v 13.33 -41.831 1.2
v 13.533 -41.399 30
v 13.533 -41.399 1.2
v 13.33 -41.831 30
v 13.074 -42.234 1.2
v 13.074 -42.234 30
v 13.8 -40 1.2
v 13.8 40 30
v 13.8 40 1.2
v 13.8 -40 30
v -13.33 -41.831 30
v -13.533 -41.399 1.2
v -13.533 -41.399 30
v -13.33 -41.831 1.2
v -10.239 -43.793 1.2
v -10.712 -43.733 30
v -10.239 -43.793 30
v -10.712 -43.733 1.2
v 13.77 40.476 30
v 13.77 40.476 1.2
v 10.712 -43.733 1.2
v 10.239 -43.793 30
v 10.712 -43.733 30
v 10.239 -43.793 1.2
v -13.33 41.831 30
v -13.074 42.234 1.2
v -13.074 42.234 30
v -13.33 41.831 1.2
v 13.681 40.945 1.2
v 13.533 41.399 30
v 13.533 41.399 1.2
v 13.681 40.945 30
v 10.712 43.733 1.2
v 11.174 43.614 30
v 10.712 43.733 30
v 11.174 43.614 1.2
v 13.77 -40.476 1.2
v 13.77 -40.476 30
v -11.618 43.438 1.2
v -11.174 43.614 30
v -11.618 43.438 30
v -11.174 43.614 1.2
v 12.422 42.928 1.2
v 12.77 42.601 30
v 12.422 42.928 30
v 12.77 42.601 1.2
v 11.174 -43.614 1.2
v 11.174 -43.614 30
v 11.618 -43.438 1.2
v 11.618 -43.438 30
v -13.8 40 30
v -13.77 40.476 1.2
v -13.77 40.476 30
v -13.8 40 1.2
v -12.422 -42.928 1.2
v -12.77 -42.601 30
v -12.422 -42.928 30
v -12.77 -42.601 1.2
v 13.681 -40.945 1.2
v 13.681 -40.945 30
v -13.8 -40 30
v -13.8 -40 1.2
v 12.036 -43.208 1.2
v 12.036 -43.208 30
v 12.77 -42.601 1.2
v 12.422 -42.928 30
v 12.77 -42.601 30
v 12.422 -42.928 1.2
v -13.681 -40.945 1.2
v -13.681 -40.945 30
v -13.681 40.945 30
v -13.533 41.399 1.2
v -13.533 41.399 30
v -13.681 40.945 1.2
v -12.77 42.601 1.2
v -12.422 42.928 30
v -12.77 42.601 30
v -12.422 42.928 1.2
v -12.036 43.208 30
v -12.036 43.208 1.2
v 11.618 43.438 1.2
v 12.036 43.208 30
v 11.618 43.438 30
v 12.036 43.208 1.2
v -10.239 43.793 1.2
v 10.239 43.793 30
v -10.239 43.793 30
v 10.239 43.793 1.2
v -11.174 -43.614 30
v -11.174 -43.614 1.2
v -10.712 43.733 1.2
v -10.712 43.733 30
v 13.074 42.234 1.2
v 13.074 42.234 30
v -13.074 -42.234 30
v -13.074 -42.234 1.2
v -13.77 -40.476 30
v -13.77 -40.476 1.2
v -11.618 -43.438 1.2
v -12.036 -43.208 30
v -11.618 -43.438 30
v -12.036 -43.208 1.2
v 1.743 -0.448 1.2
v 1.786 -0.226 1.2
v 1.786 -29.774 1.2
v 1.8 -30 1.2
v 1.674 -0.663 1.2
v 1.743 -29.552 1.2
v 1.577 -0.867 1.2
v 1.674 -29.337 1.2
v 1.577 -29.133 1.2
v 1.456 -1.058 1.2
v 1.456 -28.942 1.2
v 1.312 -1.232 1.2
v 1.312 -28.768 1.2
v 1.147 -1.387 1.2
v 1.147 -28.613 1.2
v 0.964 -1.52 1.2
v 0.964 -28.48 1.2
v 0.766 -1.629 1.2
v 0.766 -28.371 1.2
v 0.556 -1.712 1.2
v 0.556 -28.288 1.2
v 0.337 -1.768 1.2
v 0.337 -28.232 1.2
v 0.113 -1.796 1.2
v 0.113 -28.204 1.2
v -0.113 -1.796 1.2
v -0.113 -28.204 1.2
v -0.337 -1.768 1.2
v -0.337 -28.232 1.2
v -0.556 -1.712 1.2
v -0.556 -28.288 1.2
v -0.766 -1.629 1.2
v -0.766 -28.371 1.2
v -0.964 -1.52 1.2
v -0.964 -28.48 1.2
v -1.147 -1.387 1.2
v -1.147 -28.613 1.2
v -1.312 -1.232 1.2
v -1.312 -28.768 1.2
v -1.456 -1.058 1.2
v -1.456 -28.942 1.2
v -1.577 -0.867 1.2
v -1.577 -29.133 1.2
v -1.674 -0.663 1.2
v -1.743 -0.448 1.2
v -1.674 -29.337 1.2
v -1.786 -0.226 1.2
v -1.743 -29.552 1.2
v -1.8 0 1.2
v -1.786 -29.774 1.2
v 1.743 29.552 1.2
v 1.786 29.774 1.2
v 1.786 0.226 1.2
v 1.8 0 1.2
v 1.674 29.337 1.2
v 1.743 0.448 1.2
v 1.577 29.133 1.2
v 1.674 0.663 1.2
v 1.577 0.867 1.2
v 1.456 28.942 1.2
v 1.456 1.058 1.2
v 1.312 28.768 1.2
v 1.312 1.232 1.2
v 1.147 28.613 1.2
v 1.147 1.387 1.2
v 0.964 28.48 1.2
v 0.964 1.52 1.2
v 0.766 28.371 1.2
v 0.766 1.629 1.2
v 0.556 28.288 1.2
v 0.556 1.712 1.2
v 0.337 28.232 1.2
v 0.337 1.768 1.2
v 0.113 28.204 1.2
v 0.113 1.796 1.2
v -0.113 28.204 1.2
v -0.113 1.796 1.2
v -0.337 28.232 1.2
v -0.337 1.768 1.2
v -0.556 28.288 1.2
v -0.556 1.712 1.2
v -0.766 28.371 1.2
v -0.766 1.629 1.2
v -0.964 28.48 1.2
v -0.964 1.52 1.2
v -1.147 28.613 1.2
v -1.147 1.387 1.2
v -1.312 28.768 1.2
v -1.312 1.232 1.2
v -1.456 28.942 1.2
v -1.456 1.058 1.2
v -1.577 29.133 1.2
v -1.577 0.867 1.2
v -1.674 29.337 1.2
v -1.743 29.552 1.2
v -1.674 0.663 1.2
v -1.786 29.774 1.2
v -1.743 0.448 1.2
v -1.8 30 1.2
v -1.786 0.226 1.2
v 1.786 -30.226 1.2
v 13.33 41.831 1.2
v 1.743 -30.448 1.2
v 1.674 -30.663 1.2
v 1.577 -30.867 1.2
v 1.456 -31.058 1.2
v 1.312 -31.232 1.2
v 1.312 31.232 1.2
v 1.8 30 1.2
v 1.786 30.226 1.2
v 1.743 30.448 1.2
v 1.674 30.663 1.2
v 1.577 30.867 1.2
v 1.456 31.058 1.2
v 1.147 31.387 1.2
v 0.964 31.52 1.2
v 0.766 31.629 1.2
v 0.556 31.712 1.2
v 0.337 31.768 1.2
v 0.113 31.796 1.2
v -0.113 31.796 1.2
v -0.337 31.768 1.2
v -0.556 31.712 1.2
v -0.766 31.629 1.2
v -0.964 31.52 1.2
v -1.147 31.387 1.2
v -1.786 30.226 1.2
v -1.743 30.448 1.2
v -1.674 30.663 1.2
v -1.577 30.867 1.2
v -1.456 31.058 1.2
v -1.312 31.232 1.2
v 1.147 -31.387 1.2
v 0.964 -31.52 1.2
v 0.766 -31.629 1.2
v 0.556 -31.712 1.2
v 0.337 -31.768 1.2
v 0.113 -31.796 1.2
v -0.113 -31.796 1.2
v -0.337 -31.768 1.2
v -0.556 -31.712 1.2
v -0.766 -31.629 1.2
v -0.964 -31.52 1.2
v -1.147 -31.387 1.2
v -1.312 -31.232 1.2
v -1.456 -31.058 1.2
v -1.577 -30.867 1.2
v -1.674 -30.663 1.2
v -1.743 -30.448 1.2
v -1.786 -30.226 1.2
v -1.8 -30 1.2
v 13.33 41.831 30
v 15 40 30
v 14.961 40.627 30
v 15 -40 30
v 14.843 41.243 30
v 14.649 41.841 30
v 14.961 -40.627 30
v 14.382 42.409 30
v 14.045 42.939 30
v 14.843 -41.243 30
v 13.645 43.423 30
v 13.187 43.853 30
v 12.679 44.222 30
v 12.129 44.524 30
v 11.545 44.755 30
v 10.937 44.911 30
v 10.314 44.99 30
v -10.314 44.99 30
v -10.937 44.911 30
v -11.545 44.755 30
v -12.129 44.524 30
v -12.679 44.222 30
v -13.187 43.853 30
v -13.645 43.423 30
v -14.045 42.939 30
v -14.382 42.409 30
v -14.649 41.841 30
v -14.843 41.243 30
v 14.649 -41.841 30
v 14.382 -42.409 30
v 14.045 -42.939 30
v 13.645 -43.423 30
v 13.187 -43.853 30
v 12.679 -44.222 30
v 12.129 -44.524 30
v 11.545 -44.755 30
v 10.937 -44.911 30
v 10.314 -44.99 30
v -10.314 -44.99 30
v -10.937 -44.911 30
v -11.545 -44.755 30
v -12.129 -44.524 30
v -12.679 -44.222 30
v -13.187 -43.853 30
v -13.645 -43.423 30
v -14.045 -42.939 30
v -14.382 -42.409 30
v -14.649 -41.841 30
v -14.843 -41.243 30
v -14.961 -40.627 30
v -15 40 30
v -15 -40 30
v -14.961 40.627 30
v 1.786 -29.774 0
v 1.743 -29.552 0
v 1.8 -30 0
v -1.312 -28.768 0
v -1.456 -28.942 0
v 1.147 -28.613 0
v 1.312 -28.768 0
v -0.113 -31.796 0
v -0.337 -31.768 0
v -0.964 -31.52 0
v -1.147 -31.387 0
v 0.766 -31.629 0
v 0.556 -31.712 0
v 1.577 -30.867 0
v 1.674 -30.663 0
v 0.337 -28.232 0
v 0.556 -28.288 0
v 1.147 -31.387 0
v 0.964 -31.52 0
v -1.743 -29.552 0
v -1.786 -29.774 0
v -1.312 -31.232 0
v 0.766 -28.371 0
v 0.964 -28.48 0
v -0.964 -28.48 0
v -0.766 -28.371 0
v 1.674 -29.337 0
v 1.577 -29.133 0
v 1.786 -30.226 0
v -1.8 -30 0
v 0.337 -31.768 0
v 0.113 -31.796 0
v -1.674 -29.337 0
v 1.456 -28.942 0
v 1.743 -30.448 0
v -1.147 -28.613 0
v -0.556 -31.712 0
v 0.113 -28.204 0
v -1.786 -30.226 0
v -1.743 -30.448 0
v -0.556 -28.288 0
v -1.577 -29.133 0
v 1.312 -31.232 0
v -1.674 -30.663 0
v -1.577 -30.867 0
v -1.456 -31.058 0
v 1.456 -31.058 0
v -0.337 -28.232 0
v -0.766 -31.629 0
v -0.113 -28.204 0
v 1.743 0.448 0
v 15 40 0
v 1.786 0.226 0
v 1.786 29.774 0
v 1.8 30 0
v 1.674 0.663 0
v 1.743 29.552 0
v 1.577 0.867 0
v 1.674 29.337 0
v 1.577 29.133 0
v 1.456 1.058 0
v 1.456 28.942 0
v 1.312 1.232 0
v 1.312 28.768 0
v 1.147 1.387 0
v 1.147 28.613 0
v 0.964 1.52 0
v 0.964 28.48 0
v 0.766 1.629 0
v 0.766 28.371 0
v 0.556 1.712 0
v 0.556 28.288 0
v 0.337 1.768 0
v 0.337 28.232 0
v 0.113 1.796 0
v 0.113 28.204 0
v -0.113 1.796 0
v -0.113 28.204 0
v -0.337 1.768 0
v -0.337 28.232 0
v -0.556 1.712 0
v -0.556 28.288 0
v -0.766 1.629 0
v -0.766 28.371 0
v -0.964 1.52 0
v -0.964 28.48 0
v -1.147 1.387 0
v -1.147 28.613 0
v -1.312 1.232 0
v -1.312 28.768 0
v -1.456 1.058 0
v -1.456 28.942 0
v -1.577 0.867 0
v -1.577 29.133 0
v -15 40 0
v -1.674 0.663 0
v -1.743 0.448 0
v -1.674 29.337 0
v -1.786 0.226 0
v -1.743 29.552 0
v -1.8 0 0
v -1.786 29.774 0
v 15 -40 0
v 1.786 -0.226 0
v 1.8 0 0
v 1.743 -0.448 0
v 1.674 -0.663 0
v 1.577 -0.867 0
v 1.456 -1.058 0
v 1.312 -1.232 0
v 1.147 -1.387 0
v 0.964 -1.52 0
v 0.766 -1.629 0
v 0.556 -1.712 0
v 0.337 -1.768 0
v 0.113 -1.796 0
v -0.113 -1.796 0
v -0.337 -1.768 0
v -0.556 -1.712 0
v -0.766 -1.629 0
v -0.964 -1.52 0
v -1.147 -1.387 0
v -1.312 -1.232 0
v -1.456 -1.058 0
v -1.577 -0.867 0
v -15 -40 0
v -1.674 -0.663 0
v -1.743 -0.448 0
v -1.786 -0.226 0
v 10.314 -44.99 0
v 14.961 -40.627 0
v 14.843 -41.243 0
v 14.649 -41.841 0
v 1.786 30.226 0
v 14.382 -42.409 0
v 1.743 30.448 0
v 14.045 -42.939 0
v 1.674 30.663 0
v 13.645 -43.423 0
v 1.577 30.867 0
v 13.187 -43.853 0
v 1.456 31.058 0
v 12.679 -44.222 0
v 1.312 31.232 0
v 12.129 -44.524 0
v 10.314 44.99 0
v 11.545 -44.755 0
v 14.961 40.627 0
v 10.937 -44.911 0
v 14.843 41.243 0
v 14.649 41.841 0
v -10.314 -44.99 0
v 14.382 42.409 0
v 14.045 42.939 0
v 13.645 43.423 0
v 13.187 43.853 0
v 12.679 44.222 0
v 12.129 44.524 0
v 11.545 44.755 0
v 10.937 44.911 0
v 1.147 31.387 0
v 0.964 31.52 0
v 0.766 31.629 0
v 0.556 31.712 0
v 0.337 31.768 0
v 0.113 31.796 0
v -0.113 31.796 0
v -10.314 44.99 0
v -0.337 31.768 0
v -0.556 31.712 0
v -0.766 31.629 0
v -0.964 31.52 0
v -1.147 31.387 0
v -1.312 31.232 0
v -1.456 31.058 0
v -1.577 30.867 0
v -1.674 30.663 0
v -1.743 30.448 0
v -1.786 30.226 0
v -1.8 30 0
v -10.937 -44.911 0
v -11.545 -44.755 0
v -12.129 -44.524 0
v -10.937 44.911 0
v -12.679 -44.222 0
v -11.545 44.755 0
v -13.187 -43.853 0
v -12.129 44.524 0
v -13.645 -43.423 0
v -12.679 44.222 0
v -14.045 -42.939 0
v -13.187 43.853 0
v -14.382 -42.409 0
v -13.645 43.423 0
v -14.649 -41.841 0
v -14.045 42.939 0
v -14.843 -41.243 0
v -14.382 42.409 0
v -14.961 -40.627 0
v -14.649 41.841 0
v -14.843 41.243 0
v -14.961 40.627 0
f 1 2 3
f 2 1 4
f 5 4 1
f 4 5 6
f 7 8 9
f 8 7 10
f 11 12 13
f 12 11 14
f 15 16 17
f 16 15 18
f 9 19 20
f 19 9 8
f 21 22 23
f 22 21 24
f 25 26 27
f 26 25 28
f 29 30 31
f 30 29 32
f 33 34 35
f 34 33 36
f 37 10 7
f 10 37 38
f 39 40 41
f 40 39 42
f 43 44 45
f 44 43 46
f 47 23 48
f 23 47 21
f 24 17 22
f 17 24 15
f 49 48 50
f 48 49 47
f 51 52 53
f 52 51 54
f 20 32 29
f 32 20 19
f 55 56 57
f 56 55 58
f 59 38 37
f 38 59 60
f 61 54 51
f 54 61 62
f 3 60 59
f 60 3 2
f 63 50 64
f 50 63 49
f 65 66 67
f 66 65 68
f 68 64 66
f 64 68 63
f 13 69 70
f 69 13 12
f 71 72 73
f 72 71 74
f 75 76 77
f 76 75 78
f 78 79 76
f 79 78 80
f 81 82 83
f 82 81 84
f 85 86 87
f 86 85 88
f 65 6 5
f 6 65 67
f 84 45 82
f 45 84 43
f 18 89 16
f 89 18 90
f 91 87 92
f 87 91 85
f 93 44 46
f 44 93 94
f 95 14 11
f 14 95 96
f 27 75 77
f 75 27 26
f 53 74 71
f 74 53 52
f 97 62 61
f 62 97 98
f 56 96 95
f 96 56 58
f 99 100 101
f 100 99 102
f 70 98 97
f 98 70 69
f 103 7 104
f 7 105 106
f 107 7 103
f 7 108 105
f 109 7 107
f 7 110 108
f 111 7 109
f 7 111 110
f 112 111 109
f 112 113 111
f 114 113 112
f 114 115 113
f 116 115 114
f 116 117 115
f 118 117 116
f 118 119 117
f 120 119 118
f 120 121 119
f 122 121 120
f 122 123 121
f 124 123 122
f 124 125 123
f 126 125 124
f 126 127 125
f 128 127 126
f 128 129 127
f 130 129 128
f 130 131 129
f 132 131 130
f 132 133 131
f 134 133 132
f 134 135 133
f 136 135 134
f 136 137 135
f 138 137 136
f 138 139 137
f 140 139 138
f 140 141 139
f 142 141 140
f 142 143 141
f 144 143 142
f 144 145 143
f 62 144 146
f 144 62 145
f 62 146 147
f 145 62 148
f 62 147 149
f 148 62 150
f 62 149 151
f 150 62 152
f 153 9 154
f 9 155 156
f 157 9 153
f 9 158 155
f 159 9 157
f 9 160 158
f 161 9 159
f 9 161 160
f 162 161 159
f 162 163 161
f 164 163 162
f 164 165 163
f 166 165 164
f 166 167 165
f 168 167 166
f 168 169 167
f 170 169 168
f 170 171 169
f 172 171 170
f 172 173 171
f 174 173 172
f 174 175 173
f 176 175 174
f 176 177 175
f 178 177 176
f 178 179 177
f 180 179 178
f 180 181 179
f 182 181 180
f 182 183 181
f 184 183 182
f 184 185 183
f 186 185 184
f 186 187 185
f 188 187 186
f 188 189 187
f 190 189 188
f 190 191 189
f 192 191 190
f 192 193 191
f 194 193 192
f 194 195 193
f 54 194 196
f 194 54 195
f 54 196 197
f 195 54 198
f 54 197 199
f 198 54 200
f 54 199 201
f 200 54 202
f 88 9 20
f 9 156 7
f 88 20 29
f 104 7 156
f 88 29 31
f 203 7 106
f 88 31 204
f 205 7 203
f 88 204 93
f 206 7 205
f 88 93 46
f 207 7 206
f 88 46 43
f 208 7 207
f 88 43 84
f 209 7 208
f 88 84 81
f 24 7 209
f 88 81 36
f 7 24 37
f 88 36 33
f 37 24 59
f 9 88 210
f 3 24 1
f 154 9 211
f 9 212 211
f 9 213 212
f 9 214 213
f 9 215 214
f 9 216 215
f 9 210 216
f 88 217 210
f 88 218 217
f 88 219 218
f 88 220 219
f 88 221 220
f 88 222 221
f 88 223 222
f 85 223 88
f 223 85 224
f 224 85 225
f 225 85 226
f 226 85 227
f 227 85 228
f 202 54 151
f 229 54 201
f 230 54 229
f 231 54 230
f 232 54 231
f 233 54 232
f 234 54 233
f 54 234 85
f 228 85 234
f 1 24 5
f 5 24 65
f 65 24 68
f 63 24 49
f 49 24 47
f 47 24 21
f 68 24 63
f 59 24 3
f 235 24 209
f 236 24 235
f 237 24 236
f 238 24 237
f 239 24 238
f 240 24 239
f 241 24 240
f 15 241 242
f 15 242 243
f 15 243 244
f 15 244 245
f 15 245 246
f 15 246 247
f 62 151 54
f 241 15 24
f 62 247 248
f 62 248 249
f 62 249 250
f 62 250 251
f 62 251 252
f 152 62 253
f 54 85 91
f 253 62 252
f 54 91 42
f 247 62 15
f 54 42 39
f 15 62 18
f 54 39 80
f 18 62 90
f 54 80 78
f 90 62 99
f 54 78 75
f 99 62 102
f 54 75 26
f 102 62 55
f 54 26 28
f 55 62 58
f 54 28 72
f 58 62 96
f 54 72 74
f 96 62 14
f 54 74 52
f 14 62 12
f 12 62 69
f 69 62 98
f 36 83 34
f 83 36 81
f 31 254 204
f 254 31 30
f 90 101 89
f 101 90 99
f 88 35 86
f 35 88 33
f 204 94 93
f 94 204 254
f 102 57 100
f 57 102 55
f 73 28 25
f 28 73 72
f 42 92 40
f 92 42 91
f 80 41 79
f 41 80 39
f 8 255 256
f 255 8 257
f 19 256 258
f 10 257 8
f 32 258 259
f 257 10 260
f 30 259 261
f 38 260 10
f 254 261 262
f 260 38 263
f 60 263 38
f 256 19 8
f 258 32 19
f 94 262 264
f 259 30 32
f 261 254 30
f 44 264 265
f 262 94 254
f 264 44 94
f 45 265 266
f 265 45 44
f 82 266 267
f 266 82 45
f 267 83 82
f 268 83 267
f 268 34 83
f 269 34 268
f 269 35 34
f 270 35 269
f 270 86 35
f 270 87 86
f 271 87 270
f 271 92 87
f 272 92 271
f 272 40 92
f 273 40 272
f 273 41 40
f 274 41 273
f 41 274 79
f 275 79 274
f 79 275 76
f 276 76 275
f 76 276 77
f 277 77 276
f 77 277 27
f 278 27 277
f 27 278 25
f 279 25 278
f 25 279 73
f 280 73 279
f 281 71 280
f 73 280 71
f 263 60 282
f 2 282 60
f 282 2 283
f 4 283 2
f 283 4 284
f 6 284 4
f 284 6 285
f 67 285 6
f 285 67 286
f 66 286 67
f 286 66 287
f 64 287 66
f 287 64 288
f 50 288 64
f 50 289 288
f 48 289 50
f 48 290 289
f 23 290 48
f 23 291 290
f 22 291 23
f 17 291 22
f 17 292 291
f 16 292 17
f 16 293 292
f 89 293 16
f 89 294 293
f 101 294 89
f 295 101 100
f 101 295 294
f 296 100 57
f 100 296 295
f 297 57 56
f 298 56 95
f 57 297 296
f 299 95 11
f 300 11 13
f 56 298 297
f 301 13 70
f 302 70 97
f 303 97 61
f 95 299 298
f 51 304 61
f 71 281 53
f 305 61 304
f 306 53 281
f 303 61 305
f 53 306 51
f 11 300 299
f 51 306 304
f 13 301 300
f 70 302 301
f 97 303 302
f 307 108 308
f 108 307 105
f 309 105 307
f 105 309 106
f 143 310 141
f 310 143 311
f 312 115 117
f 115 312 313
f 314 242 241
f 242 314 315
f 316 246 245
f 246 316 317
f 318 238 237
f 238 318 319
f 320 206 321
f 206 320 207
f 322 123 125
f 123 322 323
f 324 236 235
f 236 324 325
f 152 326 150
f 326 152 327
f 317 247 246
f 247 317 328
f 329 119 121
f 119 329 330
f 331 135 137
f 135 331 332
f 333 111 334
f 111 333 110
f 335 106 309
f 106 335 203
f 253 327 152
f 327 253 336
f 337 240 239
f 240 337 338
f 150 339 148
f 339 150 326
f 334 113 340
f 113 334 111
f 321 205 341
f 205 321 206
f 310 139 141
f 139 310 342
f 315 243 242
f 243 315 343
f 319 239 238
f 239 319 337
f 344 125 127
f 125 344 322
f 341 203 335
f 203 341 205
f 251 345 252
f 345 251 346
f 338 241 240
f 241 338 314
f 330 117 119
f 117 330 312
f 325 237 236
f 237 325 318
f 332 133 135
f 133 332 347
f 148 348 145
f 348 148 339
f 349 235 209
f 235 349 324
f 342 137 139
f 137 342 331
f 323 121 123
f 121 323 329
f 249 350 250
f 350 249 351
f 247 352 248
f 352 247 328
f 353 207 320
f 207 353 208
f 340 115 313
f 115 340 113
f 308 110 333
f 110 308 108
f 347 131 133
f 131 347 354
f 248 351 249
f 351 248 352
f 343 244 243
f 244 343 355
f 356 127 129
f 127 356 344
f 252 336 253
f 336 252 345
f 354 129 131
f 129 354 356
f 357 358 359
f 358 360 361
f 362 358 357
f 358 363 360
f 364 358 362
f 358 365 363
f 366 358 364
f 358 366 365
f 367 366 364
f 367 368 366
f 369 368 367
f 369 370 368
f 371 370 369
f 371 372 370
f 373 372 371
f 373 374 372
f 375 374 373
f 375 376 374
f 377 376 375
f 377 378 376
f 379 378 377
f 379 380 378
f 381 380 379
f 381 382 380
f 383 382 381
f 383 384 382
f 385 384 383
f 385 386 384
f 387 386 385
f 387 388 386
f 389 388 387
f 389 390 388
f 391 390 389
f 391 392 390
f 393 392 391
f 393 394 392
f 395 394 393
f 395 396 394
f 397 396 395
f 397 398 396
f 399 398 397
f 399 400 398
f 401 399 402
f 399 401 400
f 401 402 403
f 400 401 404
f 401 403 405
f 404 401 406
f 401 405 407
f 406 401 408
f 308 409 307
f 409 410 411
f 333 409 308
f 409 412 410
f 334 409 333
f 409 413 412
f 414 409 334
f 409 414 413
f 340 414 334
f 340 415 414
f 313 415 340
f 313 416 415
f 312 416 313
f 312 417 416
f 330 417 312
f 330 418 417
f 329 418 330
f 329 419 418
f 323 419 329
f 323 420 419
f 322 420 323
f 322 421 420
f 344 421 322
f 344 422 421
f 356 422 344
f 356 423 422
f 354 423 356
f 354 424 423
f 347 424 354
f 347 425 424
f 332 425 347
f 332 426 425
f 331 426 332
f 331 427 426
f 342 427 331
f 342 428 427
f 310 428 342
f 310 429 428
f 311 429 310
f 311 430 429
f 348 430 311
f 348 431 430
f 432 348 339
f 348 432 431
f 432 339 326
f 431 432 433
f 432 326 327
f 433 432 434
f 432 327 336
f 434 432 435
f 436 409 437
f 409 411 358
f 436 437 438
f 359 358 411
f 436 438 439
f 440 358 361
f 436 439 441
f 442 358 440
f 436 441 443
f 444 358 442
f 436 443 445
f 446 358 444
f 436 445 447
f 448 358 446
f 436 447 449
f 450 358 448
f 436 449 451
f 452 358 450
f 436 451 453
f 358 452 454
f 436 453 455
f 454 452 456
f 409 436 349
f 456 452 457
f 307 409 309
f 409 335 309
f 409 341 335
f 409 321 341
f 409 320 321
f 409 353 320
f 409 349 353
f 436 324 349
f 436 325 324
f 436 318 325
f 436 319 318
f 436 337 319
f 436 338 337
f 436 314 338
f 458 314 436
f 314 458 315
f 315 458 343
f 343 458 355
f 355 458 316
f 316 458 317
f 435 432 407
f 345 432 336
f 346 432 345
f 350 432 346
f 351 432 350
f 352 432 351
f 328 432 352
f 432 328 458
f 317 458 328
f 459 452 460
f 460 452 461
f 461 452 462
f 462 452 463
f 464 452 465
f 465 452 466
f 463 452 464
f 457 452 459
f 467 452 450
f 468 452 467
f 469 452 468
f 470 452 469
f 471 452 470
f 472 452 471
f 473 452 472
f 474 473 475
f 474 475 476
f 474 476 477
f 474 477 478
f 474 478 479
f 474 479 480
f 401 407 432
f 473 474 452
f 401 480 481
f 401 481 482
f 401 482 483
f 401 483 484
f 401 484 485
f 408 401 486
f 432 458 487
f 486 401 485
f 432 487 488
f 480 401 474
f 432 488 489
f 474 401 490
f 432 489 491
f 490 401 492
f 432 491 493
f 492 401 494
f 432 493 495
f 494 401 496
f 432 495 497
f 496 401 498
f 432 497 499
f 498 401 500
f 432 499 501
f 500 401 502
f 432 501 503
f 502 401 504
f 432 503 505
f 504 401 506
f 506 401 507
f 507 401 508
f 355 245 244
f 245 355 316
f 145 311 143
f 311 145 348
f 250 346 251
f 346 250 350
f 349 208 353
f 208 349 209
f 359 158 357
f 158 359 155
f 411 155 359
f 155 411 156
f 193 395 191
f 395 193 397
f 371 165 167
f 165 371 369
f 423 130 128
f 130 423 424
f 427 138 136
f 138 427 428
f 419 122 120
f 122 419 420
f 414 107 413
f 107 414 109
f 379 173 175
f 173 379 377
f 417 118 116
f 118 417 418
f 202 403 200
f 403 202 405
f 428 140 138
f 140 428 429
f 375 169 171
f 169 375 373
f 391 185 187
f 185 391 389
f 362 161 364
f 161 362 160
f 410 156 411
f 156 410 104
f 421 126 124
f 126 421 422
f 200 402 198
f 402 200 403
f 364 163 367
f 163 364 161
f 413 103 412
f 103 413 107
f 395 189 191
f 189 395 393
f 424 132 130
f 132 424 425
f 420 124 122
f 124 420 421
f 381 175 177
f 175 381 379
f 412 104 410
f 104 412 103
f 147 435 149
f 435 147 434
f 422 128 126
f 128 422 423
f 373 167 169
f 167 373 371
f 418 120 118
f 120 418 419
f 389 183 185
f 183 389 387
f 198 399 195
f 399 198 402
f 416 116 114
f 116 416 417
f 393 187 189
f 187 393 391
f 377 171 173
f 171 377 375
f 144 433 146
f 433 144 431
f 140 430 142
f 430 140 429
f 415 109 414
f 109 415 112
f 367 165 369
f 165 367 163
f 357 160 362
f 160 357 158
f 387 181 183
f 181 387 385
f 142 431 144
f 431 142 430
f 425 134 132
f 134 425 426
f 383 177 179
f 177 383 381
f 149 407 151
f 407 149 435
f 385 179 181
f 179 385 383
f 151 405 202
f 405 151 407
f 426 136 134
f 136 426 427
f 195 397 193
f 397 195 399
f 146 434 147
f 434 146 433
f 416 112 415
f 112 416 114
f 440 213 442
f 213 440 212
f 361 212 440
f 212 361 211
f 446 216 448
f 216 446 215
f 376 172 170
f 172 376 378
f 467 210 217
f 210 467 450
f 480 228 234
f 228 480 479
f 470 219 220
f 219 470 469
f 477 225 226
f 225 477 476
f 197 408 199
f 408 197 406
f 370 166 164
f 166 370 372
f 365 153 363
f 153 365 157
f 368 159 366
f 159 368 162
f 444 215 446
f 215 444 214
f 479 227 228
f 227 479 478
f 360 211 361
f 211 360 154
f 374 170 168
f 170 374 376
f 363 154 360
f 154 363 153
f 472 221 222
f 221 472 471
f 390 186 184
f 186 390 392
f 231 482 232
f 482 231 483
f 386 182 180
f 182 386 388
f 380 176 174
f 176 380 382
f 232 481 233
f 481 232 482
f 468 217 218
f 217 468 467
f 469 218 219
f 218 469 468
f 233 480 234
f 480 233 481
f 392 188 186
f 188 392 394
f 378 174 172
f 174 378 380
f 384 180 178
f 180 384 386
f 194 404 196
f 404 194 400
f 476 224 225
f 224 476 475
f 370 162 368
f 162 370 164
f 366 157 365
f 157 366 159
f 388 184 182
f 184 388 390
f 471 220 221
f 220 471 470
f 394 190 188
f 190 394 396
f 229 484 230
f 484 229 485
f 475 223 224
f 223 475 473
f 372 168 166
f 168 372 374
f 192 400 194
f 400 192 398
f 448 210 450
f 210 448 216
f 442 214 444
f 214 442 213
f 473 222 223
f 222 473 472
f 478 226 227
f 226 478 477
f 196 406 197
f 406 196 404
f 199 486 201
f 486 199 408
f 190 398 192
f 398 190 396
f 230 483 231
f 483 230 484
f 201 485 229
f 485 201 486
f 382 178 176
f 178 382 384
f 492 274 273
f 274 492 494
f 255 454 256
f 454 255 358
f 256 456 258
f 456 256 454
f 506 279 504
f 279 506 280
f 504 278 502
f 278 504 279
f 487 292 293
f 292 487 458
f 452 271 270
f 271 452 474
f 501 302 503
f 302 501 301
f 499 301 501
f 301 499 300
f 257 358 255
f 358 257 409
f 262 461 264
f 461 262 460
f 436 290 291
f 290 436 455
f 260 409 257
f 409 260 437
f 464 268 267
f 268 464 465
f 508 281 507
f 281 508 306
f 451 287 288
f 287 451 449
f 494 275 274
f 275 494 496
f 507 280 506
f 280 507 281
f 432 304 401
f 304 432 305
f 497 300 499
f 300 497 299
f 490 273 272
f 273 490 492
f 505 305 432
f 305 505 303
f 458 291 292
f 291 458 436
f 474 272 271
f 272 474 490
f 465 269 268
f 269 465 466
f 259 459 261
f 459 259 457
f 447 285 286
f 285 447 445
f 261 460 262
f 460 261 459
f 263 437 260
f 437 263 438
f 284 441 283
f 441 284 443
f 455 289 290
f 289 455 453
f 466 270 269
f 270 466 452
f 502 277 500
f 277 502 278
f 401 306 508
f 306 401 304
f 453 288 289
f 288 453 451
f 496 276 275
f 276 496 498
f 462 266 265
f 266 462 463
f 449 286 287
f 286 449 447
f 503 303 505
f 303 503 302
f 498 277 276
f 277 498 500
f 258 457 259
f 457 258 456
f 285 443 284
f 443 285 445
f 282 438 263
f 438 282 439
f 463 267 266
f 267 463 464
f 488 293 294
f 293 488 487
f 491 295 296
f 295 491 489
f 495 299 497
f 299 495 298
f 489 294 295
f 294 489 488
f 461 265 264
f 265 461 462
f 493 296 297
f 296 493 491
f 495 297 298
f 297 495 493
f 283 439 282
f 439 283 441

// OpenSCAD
$fn = 50;


difference() {
	union() {
		hull() {
			translate(v = [-10.0000000000, 40.0000000000, 0]) {
				cylinder(h = 30, r = 5);
			}
			translate(v = [10.0000000000, 40.0000000000, 0]) {
				cylinder(h = 30, r = 5);
			}
			translate(v = [-10.0000000000, -40.0000000000, 0]) {
				cylinder(h = 30, r = 5);
			}
			translate(v = [10.0000000000, -40.0000000000, 0]) {
				cylinder(h = 30, r = 5);
			}
		}
	}
	union() {
		translate(v = [0, 0, 1.2000000000]) {
			hull() {
				translate(v = [-10.0000000000, 40.0000000000, 0]) {
					cylinder(h = 28.8000000000, r = 3.8000000000);
				}
				translate(v = [10.0000000000, 40.0000000000, 0]) {
					cylinder(h = 28.8000000000, r = 3.8000000000);
				}
				translate(v = [-10.0000000000, -40.0000000000, 0]) {
					cylinder(h = 28.8000000000, r = 3.8000000000);
				}
				translate(v = [10.0000000000, -40.0000000000, 0]) {
					cylinder(h = 28.8000000000, r = 3.8000000000);
				}
			}
		}
		#translate(v = [0.0000000000, -30.0000000000, 0]) {
			cylinder(h = 1.2000000000, r = 1.8000000000);
		}
		#cylinder(h = 1.2000000000, r = 1.8000000000);
		#translate(v = [0.0000000000, 30.0000000000, 0]) {
			cylinder(h = 1.2000000000, r = 1.8000000000);
		}
	}
}
